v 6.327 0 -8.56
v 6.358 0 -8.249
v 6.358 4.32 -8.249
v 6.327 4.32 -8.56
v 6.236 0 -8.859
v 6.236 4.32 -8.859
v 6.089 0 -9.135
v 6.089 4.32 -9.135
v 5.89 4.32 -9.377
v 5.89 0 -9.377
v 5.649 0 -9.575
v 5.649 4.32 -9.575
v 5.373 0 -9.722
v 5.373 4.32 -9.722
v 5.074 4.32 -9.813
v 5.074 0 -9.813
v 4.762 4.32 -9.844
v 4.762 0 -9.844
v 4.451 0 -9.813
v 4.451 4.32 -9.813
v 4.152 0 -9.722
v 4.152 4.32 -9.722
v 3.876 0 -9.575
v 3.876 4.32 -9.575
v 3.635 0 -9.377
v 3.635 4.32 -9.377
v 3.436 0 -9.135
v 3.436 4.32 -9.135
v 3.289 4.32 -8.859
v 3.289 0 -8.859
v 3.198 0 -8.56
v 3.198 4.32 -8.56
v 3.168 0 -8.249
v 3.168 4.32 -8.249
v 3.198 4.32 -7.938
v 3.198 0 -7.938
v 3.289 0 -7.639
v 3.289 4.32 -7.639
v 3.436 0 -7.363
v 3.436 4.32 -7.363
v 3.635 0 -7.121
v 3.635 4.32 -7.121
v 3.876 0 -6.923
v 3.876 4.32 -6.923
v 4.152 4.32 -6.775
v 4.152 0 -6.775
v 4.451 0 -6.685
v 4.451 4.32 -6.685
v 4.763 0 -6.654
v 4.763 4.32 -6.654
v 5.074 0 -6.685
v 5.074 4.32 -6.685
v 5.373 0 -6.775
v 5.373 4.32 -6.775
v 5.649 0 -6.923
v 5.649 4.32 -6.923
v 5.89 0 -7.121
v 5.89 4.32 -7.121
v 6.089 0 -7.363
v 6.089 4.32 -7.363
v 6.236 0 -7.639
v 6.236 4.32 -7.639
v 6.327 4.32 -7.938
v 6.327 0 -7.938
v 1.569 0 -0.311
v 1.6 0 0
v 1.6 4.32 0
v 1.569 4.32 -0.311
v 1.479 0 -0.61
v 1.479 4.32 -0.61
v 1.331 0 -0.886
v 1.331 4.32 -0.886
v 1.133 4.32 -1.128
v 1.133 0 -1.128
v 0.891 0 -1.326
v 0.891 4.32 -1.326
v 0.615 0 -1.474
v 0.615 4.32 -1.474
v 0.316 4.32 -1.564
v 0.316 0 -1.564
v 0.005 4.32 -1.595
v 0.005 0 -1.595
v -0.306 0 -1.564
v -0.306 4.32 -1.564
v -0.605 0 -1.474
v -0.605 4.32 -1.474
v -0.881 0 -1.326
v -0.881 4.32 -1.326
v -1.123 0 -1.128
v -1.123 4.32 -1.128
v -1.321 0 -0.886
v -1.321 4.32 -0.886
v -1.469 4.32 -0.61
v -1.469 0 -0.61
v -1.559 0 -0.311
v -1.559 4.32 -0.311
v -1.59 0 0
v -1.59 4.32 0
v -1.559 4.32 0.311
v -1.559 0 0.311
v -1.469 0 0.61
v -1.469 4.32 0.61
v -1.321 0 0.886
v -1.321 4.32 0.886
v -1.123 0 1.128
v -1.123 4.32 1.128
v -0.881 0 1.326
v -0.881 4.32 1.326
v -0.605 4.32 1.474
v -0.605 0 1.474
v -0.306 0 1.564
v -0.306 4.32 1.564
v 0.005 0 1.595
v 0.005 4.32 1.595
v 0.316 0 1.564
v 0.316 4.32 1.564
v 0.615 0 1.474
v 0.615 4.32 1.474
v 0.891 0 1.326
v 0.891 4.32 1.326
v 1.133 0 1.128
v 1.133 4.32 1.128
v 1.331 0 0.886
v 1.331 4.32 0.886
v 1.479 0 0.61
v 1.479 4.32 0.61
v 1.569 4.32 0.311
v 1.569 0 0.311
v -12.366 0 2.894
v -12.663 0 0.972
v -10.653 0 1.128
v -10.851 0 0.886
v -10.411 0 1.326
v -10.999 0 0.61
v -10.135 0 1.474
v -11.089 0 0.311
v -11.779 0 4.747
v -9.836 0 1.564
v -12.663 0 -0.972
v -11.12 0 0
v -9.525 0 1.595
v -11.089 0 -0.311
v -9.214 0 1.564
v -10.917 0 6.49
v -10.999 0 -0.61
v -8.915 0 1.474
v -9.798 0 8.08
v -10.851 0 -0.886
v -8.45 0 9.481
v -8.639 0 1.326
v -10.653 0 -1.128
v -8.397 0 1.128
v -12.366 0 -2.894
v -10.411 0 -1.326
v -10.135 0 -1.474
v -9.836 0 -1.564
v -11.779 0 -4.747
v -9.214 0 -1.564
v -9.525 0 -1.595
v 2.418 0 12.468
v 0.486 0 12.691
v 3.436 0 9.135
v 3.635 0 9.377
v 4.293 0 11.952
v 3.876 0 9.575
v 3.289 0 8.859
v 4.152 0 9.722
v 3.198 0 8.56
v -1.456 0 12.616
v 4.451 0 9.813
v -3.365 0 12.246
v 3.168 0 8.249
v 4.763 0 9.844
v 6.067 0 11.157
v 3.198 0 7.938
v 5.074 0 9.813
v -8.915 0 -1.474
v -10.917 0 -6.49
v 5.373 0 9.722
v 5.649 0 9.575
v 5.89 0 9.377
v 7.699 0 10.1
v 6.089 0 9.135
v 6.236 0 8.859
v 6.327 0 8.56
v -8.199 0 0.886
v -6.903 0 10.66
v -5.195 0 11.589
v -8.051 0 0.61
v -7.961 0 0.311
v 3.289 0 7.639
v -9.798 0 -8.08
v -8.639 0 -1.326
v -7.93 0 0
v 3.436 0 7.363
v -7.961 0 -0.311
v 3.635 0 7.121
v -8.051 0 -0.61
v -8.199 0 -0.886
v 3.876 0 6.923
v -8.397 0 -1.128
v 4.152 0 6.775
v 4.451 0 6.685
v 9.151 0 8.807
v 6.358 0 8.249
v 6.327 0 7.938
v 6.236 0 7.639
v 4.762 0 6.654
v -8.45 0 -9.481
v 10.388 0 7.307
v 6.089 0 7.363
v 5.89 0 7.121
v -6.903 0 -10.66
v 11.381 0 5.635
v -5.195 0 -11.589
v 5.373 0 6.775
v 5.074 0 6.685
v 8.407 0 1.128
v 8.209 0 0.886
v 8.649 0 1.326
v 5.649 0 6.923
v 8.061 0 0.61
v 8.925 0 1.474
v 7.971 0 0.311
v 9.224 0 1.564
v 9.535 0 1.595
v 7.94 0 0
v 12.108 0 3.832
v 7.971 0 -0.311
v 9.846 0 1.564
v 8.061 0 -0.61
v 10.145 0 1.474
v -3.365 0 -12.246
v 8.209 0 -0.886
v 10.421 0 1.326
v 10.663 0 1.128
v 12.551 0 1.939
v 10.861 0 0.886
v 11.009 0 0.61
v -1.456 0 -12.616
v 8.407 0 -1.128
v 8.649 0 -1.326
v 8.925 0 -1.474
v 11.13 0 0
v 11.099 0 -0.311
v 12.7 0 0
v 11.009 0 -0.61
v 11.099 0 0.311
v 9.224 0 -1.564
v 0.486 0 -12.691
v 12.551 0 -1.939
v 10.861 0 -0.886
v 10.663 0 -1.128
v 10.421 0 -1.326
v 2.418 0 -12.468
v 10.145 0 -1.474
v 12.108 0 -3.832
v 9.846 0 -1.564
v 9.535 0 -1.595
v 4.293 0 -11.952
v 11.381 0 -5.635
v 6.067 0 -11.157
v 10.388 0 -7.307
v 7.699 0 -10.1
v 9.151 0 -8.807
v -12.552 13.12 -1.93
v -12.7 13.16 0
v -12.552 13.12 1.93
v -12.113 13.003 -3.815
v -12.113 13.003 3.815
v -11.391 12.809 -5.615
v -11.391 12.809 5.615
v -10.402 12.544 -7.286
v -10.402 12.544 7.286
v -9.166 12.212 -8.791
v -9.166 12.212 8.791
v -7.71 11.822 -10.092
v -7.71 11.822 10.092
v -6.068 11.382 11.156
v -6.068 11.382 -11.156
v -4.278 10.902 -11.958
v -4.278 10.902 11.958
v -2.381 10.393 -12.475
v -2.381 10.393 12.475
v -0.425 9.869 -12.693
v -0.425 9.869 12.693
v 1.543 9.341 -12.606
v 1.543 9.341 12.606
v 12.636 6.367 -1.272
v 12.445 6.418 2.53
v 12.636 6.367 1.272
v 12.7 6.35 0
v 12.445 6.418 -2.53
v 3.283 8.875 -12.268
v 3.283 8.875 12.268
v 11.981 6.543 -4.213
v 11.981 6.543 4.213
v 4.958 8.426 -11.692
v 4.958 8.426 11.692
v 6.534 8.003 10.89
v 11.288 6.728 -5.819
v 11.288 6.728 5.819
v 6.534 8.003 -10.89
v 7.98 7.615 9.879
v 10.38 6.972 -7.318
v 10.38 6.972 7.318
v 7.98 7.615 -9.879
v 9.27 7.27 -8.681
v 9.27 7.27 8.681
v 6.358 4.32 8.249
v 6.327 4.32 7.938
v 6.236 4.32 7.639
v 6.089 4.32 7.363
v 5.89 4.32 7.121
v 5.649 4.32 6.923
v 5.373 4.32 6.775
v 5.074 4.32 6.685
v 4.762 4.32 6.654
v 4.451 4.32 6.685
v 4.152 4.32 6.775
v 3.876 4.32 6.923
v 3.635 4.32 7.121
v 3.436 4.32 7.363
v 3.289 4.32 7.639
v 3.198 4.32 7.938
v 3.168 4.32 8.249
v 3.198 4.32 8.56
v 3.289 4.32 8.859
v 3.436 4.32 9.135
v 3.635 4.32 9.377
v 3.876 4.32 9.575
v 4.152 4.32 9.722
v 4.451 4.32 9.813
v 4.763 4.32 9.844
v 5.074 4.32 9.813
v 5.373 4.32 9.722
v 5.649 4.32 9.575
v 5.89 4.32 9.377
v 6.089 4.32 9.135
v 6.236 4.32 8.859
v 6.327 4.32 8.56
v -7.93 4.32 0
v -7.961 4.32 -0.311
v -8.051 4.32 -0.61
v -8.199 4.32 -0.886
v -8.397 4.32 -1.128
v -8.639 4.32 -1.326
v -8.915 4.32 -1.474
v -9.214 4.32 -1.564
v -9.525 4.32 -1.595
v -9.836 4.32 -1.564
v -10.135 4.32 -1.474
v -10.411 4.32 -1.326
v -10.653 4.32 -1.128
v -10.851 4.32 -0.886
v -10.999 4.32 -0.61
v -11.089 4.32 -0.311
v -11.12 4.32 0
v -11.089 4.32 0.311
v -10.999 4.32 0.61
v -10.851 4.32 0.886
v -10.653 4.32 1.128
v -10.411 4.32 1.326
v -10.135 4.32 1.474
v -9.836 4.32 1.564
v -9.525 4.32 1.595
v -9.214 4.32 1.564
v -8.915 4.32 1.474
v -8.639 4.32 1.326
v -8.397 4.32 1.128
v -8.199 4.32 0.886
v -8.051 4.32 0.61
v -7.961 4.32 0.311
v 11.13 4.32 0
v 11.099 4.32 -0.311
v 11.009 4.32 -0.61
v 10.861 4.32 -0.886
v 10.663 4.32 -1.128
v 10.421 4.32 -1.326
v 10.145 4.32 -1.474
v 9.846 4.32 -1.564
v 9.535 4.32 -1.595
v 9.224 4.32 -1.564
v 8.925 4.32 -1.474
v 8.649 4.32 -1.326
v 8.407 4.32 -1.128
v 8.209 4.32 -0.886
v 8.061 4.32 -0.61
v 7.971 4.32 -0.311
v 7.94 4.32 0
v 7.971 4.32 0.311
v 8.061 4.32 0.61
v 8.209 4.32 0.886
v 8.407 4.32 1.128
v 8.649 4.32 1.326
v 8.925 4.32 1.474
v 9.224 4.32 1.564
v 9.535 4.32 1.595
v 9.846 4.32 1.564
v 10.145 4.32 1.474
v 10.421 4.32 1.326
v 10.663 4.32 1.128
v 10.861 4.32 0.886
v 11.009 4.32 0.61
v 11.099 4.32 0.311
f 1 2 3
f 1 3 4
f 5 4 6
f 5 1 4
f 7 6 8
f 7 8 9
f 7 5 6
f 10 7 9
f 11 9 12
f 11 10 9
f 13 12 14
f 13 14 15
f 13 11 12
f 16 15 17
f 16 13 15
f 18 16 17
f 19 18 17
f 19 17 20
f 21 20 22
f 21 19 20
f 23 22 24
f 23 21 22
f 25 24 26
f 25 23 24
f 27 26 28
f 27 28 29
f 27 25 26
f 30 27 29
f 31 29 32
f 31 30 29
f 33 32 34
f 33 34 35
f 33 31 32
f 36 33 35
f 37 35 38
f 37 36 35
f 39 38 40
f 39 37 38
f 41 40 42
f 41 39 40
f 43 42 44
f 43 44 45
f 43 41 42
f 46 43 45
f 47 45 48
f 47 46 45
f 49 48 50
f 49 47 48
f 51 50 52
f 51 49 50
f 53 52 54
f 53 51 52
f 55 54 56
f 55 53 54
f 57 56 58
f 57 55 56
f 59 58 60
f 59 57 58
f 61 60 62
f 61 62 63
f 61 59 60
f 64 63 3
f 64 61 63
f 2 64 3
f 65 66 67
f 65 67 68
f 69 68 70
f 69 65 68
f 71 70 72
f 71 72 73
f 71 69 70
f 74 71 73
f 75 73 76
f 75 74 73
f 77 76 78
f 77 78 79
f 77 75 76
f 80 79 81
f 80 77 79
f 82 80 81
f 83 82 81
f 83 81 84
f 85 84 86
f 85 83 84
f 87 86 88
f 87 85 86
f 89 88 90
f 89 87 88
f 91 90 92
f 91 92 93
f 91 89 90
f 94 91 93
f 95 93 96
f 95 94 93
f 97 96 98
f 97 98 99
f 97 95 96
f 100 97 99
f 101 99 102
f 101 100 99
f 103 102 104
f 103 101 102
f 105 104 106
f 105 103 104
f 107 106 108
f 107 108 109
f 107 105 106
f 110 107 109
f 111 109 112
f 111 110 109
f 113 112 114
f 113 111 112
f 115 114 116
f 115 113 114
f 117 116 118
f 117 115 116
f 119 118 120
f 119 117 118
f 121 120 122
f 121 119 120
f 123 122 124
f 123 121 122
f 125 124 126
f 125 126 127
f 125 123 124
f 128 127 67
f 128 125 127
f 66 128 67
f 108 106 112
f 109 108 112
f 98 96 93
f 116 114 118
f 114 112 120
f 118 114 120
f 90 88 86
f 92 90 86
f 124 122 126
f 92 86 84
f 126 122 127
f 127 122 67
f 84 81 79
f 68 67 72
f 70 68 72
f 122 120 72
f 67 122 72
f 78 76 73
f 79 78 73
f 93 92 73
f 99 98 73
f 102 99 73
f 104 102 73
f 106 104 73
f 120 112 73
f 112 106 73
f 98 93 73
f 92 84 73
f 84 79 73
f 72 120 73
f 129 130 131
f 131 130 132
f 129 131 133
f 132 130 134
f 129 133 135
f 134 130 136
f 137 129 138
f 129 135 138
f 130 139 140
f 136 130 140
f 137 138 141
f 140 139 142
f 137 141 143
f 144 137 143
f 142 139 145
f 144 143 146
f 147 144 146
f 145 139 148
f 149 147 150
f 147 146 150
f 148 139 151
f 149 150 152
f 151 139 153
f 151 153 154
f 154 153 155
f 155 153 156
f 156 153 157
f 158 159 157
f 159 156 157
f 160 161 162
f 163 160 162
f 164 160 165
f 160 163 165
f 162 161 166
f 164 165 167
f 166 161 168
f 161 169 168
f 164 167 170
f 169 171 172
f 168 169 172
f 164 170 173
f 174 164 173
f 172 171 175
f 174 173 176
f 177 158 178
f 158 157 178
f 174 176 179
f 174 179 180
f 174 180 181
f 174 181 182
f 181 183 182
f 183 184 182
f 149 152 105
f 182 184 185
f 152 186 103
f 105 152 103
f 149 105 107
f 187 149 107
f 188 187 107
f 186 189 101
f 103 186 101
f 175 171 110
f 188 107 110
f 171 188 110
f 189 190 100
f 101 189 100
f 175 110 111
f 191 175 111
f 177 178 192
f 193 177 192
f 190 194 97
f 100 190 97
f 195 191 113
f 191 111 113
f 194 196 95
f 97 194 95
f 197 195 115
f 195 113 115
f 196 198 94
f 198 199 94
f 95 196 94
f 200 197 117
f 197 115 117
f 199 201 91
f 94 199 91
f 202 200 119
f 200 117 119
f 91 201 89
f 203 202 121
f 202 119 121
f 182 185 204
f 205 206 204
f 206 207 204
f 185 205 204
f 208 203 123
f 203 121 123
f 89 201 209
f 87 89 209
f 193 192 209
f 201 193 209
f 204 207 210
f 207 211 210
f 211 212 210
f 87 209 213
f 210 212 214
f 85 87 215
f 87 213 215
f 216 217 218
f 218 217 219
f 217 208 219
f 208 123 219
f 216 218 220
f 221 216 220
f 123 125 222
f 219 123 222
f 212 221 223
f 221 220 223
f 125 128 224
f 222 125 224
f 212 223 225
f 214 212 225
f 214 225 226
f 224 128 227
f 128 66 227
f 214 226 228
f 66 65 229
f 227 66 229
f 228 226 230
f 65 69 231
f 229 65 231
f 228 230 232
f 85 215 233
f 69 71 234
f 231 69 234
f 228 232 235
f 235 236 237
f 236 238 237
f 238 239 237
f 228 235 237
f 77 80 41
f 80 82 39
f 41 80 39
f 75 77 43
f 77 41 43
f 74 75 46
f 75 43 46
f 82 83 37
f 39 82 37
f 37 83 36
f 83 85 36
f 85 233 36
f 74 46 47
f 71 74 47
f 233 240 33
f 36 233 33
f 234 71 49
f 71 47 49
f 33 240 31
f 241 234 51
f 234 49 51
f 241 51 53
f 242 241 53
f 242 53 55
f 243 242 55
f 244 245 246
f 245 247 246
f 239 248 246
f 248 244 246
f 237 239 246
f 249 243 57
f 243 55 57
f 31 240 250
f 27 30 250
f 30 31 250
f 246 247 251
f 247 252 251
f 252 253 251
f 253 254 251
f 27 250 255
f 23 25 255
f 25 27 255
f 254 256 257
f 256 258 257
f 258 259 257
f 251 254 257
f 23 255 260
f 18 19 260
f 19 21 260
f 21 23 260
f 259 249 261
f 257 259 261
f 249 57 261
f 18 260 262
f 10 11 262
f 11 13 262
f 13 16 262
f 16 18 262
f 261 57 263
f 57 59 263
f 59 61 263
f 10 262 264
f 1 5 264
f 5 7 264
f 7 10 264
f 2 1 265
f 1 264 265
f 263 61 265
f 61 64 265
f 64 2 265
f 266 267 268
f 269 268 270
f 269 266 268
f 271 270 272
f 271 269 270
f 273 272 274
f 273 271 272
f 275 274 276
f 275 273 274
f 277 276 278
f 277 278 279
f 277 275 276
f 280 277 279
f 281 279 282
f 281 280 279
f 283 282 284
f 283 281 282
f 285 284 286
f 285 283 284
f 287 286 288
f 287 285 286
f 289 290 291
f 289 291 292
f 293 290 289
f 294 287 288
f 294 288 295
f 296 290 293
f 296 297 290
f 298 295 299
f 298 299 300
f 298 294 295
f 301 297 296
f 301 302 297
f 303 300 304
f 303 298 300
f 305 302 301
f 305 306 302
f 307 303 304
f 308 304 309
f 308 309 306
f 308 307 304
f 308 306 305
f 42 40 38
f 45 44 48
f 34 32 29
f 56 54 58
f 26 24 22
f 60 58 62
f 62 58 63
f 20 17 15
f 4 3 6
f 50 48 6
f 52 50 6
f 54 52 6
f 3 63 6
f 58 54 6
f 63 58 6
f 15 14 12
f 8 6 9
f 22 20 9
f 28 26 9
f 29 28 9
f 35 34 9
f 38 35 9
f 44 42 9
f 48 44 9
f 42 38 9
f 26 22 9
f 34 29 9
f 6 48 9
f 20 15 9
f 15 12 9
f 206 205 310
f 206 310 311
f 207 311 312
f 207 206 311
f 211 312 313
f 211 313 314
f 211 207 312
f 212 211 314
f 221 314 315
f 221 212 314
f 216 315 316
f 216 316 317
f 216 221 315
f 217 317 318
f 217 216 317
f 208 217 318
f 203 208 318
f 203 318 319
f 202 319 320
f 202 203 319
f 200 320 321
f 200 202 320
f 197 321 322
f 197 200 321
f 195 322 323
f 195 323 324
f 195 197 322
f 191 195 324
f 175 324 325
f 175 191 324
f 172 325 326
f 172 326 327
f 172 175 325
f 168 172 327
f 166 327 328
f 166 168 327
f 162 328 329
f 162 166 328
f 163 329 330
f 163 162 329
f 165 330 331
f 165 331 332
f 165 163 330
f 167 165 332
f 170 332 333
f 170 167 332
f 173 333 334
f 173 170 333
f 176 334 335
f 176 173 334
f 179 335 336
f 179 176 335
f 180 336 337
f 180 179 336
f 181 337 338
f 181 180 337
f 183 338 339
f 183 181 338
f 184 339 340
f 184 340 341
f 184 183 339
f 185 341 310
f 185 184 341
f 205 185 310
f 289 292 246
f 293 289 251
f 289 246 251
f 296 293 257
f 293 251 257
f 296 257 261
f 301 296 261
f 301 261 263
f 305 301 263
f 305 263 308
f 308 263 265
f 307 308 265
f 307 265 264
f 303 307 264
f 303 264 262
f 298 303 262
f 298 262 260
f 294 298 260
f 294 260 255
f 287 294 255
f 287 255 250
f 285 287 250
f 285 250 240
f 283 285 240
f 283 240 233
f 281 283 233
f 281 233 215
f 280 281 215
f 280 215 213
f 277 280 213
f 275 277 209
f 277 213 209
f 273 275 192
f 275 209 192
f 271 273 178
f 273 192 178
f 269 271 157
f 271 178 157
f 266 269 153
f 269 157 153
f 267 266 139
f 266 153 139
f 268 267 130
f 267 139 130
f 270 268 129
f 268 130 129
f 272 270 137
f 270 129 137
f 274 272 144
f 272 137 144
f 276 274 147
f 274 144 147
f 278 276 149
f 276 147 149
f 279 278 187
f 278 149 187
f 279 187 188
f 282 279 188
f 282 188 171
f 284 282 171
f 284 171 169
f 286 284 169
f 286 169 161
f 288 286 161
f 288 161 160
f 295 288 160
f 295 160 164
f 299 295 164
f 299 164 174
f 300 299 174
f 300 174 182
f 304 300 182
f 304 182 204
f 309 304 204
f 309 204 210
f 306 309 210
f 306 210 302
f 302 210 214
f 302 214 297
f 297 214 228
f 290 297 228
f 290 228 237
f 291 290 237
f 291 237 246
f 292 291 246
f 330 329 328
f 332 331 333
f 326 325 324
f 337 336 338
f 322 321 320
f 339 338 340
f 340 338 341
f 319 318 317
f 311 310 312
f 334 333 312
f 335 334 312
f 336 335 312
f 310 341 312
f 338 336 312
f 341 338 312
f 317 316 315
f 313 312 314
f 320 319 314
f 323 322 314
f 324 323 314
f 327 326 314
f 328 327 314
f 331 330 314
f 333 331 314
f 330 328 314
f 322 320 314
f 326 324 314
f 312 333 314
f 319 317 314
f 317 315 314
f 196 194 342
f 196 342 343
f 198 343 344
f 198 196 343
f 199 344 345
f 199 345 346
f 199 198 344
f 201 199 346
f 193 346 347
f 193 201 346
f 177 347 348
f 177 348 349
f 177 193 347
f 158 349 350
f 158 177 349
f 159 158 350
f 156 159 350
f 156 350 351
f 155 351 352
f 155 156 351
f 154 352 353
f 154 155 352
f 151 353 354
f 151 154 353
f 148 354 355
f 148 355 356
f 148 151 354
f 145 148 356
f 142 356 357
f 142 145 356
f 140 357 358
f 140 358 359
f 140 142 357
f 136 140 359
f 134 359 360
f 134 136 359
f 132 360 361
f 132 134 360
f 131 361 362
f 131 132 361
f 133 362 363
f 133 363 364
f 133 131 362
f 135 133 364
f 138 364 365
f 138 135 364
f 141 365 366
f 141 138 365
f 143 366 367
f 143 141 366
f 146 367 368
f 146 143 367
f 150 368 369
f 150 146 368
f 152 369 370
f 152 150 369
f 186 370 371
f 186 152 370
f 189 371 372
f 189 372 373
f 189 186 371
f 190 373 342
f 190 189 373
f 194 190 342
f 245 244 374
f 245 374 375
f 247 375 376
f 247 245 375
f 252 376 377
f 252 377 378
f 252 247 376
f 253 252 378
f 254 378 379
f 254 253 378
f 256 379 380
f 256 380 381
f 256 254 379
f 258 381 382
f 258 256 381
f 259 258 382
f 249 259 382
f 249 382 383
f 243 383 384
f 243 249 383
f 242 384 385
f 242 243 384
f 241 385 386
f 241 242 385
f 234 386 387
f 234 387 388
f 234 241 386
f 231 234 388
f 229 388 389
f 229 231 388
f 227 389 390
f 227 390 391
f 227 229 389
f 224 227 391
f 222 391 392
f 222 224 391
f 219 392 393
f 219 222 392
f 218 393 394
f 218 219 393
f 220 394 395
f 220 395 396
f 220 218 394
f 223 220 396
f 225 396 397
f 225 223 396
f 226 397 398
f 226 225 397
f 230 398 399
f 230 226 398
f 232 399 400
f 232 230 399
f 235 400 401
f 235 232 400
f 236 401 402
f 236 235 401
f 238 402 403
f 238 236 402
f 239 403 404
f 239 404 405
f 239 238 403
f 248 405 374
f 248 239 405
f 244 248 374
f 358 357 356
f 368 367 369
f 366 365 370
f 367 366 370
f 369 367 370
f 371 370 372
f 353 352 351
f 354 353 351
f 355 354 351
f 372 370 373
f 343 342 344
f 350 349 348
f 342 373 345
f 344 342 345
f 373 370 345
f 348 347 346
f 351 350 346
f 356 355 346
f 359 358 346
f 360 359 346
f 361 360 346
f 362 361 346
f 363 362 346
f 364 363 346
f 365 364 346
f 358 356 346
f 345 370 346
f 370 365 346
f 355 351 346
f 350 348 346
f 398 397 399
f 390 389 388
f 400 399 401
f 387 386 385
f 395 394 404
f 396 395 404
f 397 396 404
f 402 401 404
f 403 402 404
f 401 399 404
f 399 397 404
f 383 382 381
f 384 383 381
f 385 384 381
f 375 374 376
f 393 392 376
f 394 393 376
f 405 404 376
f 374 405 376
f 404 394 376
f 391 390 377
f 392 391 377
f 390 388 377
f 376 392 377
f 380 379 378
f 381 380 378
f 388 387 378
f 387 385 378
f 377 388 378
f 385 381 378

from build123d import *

# Parameters (mm, degrees)
SKETCH1_R               = 12.7
BOSS_EXTRUDE1_DEPTH     = 13.16
CUT_EXTRUDE4_DEPTH      = 13.7
CUT_EXTRUDE4_DEPTH_BACK = 13.7
SKETCH4_R               = 1.595
CUT_EXTRUDE9_DEPTH      = 4.32


with BuildPart() as part:
    # Sketch1 → Boss-Extrude1 (new body)
    with BuildSketch(Plane(origin=(0, 0, 0), x_dir=(1, 0, 0), z_dir=(0, 1, 0))):
        Circle(SKETCH1_R)
    extrude(amount=BOSS_EXTRUDE1_DEPTH)

    # Sketch2 → Cut-Extrude4 (cut, two sides)
    with BuildSketch(Plane.XY) as cut_extrude4_sk:
        Polygon((-77.620622605, 30.565883462), (-12.7, 13.16), (12.7, 6.35), (77.620622605, -11.055883462), (112.43238953, 118.785361749), (-42.808855681, 160.407128673), align=None)
    extrude(amount=CUT_EXTRUDE4_DEPTH, mode=Mode.SUBTRACT)
    extrude(cut_extrude4_sk.sketch, amount=-CUT_EXTRUDE4_DEPTH_BACK, mode=Mode.SUBTRACT)

    # Sketch4 → Cut-Extrude9 (cut)
    with BuildSketch(Plane(origin=(0, 0, 0), x_dir=(1, 0, 0), z_dir=(0, 1, 0))):
        with Locations((-9.525, 0)):
            Circle(SKETCH4_R)
        with Locations((0.005, 0)):
            Circle(SKETCH4_R)
        with Locations((9.535, 0)):
            Circle(SKETCH4_R)
        with Locations((4.7625, 8.248891971)):
            Circle(SKETCH4_R)
        with Locations((4.7625, -8.248891971)):
            Circle(SKETCH4_R)
    extrude(amount=CUT_EXTRUDE9_DEPTH, mode=Mode.SUBTRACT)


solid = part.part
